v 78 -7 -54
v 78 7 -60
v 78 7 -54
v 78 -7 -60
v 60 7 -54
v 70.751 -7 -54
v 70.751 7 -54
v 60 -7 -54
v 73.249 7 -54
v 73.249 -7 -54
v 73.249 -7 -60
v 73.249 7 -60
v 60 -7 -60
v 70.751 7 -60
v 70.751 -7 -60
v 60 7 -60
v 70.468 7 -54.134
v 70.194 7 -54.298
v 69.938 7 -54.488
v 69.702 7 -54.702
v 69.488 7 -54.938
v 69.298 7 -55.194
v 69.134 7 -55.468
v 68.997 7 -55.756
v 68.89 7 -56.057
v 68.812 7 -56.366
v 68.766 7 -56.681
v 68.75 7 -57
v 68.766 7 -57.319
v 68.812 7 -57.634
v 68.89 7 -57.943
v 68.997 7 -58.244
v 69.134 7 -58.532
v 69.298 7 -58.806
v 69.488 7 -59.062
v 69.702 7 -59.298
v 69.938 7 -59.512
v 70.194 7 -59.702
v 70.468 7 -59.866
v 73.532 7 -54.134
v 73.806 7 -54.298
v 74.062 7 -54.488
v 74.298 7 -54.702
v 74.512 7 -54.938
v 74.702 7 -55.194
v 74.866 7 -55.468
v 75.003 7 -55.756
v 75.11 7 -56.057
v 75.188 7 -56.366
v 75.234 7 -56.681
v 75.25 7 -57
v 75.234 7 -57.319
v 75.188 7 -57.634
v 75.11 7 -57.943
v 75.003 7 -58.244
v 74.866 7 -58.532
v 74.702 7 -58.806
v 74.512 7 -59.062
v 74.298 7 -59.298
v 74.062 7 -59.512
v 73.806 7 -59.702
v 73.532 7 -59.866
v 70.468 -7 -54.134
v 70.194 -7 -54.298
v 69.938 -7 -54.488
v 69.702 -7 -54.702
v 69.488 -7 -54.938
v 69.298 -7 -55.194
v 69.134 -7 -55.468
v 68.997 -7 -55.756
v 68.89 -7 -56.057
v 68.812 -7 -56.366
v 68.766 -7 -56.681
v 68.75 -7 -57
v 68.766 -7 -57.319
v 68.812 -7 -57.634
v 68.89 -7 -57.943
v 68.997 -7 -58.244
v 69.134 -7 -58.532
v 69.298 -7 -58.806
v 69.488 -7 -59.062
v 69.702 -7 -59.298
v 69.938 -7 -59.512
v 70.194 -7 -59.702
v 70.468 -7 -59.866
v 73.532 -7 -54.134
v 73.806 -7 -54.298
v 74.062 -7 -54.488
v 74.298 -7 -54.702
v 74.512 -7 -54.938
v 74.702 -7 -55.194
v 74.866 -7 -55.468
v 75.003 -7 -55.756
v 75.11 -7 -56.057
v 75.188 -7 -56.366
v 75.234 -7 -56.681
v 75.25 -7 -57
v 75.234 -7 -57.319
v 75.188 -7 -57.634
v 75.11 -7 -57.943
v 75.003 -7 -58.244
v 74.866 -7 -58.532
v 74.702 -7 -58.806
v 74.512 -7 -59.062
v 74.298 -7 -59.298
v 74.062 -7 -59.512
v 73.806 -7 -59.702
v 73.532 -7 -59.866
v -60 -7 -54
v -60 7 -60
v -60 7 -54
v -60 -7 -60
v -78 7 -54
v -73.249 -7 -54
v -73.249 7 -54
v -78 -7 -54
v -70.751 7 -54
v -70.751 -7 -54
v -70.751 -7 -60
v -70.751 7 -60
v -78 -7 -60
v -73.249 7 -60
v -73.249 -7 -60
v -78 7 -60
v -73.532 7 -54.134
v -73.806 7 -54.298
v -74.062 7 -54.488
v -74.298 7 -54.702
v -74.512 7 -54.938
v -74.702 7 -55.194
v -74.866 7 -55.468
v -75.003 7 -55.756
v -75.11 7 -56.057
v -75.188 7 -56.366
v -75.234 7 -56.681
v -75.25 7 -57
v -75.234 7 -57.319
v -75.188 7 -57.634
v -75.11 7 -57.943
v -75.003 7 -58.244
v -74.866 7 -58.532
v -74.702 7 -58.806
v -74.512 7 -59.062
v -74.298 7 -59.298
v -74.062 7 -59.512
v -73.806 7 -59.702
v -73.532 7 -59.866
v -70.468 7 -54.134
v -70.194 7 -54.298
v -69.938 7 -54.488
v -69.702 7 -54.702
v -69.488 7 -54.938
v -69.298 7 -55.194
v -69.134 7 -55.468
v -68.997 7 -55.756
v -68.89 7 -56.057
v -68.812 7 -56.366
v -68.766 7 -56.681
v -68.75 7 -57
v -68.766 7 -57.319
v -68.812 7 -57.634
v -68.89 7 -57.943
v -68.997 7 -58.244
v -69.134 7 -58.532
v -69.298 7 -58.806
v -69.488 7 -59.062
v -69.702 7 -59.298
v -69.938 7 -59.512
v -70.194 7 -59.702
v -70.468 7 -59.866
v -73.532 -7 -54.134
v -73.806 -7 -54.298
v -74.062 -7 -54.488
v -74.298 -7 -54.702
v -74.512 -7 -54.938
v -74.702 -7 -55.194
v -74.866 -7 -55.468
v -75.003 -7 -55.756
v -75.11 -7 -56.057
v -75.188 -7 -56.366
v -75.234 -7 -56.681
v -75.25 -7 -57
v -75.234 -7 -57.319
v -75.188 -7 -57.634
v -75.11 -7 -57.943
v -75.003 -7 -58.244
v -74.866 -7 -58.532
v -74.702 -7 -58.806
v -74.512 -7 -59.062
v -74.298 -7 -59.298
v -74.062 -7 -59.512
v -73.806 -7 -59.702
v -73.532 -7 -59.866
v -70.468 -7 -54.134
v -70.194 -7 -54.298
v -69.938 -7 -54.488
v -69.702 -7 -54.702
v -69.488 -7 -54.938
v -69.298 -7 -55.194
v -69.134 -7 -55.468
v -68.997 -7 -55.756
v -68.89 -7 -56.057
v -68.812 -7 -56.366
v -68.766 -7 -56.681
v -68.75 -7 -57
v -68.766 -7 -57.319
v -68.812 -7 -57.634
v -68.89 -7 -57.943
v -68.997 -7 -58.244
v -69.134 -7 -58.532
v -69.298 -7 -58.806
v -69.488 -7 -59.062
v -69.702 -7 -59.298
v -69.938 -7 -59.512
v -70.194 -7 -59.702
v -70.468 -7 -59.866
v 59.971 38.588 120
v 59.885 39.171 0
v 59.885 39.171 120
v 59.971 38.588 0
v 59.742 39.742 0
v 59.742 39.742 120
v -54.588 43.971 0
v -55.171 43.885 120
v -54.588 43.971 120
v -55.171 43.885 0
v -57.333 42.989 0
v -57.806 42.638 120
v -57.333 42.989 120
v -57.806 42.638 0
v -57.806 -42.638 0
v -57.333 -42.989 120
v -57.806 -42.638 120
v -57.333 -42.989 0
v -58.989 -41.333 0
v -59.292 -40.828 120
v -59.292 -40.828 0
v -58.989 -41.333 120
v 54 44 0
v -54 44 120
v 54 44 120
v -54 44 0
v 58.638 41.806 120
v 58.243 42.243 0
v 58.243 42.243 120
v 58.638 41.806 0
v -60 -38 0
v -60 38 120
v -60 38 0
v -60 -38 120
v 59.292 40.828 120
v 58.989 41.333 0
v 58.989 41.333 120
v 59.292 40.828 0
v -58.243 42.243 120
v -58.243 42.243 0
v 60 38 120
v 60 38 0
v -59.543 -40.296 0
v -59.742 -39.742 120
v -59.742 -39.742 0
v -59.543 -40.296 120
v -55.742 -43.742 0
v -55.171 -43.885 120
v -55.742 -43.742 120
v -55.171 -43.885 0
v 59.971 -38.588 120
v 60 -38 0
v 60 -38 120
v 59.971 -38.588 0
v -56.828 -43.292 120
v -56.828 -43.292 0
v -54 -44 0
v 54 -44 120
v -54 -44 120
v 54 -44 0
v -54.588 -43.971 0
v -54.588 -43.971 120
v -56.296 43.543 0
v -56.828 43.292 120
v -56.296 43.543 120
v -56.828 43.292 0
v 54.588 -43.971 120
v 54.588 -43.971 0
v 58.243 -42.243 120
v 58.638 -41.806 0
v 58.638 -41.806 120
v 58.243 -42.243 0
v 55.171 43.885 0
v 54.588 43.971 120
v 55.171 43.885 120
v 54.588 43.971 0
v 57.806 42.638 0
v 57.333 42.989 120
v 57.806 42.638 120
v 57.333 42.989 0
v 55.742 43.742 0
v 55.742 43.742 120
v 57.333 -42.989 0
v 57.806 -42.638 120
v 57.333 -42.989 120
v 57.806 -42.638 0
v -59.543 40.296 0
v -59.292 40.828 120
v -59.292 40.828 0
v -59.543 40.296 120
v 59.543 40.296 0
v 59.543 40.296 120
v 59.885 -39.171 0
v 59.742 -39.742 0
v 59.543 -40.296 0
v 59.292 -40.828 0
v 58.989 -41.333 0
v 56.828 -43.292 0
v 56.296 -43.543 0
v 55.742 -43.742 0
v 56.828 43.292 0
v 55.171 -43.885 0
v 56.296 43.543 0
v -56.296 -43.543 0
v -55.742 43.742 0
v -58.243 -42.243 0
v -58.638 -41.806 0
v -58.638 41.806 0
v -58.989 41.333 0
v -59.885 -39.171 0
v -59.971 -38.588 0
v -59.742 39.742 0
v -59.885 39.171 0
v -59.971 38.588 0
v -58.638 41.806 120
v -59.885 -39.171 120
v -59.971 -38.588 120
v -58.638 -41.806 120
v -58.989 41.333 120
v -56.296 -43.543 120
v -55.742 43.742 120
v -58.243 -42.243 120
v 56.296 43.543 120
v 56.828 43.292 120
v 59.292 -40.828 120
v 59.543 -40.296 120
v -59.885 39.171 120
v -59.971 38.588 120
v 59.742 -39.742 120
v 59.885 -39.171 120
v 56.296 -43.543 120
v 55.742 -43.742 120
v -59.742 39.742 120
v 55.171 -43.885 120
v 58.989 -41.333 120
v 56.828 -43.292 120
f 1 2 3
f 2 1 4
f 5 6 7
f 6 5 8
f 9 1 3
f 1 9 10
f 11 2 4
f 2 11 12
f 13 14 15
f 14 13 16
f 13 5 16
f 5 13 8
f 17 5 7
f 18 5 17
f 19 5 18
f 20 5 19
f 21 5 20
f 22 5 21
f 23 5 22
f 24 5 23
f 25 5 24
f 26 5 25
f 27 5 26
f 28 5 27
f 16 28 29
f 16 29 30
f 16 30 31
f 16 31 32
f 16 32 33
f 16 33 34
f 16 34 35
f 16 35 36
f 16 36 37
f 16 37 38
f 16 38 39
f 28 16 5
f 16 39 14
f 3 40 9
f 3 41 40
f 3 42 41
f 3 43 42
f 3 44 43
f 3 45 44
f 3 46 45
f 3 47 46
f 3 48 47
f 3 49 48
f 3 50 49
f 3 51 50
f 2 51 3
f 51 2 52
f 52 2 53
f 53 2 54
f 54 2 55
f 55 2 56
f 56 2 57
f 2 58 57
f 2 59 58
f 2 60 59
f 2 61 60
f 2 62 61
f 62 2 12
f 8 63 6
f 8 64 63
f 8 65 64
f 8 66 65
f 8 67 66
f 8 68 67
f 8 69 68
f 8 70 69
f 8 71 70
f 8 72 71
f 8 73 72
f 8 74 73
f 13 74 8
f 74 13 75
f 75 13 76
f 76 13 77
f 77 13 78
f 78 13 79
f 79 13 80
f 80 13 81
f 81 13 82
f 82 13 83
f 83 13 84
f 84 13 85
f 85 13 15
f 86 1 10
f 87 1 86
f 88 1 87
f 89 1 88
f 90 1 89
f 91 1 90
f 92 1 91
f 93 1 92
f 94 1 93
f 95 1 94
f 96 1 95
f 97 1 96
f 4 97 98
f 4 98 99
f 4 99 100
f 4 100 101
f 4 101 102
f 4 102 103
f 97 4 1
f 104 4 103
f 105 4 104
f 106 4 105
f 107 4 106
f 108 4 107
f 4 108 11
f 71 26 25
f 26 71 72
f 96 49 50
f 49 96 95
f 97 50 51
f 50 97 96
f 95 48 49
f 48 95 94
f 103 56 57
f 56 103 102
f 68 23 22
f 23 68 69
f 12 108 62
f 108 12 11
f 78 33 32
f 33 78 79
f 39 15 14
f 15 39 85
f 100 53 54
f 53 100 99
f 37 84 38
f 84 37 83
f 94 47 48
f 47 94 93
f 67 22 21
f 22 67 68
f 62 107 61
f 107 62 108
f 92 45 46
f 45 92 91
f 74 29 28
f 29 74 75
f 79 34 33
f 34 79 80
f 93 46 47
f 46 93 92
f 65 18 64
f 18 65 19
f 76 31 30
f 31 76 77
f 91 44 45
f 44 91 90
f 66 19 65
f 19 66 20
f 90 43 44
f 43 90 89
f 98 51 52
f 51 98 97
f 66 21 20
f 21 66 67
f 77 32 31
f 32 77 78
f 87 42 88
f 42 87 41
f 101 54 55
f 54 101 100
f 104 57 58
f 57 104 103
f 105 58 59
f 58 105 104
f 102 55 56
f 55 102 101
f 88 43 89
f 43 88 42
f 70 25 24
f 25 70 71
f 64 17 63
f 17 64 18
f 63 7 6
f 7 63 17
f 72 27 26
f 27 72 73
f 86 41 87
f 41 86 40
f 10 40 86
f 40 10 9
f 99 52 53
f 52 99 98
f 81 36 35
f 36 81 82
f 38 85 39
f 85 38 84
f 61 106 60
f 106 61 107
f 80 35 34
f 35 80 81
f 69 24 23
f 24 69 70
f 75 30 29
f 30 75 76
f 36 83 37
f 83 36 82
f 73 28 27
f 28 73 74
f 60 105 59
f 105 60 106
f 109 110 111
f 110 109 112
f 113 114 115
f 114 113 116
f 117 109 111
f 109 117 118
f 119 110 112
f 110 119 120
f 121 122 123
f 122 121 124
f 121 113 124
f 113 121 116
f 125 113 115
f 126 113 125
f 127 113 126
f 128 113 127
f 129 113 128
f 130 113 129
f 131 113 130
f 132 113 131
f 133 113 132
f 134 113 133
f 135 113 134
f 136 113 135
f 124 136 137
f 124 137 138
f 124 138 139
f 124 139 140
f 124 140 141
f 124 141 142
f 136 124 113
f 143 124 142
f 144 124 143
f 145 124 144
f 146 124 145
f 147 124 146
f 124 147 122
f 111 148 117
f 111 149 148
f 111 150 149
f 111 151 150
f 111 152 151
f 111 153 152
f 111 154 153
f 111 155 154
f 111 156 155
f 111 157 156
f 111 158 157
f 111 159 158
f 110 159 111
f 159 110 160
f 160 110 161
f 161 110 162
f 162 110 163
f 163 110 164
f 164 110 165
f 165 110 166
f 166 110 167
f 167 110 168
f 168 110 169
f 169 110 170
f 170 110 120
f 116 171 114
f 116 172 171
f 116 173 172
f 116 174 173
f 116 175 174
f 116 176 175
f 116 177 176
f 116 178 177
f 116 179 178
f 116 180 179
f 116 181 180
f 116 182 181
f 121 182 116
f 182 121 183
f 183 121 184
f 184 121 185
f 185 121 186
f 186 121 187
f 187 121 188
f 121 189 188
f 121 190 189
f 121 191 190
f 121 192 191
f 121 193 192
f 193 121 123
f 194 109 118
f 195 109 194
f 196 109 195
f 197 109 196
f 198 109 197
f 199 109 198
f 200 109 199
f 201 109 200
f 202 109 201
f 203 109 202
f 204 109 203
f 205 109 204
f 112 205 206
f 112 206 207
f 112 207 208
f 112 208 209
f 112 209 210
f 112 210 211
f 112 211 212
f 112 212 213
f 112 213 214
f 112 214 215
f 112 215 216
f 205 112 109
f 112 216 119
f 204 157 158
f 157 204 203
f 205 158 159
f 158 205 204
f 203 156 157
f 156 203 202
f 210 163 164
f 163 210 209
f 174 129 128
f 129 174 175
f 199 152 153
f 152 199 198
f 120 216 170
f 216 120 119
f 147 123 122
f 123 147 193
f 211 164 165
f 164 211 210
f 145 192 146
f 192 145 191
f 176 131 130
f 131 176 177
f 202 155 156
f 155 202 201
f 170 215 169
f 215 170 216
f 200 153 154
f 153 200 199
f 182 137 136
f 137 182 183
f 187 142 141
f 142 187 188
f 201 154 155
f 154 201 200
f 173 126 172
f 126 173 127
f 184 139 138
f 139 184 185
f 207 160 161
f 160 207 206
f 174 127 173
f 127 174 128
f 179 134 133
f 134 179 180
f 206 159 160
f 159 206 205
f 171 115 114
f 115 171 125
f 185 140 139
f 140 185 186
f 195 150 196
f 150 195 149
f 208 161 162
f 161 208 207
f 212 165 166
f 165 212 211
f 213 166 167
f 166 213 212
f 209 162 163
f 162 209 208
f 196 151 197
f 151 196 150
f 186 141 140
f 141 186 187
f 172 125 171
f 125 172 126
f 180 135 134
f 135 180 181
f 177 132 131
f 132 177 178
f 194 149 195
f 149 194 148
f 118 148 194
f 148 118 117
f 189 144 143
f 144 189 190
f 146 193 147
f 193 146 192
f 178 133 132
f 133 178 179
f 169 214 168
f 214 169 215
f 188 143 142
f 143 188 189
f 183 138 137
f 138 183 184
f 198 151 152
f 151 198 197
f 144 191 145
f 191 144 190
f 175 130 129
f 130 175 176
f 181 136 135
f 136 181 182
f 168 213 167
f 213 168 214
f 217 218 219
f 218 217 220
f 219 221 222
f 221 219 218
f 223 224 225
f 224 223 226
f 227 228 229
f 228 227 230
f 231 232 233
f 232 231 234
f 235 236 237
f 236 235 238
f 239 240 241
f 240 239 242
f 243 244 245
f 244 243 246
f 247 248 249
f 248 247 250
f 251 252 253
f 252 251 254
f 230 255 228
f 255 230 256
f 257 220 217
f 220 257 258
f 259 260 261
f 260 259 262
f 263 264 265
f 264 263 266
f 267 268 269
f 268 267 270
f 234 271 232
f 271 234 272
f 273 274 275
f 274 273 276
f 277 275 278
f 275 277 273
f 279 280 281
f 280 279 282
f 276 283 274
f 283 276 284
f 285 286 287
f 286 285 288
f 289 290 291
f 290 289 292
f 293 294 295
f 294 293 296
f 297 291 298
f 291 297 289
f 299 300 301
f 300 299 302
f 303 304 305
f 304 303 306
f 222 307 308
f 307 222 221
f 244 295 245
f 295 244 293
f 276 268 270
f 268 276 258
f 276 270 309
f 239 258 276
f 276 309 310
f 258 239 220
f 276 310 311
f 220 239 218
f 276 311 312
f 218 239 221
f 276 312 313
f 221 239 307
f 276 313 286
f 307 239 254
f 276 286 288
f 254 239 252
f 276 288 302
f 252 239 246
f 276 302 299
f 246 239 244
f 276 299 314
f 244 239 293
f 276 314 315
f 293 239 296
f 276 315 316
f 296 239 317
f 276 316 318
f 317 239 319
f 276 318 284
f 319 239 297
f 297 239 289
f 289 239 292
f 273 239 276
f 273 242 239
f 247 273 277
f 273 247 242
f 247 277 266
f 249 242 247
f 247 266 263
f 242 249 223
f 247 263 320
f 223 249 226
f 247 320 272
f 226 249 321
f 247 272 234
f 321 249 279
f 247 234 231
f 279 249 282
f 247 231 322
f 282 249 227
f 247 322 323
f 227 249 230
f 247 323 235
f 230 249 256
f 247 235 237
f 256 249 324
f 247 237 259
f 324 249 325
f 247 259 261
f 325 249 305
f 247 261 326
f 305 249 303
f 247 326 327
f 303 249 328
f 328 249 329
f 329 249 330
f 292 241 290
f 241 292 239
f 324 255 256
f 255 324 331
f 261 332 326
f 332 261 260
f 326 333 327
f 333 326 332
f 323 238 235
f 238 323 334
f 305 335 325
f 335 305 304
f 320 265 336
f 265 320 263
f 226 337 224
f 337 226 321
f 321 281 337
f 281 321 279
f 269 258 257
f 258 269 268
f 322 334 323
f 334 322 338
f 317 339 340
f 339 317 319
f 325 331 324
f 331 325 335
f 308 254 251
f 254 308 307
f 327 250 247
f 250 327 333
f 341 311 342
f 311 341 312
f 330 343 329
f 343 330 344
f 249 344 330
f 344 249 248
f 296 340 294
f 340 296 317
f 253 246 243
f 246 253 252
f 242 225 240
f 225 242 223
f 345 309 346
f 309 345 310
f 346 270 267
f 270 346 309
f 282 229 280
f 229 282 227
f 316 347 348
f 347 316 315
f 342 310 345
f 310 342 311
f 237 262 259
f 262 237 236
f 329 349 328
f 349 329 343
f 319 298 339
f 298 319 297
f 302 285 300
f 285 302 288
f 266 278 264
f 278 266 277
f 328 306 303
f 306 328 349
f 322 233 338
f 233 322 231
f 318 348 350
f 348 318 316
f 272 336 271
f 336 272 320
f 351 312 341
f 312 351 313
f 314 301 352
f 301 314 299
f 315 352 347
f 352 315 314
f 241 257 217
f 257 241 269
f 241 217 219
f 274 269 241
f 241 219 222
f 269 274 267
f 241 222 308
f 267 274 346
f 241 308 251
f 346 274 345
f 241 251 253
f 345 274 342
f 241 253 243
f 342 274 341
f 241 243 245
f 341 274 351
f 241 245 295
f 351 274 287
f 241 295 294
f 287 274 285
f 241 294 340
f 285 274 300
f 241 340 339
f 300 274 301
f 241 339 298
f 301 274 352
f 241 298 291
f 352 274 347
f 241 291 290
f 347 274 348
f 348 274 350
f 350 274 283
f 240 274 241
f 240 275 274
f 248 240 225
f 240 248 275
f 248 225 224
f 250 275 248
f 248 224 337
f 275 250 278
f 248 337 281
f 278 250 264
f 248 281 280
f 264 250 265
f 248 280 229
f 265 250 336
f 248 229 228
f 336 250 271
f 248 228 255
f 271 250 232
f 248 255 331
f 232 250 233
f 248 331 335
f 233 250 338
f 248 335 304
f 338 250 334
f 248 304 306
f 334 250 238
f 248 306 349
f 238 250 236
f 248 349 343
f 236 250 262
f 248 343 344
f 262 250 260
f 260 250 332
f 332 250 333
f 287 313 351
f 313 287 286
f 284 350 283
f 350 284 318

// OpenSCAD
$fn=64;

L=120.0;
W=88.0;
H=120.0;

module rounded_box(size=[10,10,10], r=2){
    l=size[0]; w=size[1]; h=size[2];
    r2=min(r, min(l,w)/2);
    hull(){
        for(x=[-l/2+r2, l/2-r2])
            for(y=[-w/2+r2, w/2-r2])
                translate([x,y,0]) cylinder(h=h, r=r2);
    }
}

module mounting_foot(side=1, foot_len=18, foot_w=14, foot_h=6, hole_d=6.5, hole_offset=6){
    x = side*(L/2 + foot_len/2);
    translate([x,0,-H/2 + foot_h/2])
    difference(){
        cube([foot_len, foot_w, foot_h], center=true);
        translate([side*(foot_len/2 - hole_offset),0,0])
            rotate([90,0,0]) cylinder(h=foot_w+2, d=hole_d, center=true);
    }
}

module terminal_block(side=1, blk_l=26, blk_w=18, blk_h=14, post_d=3.2, post_h=10, post_pitch=7.5){
    x = side*(L/2 - blk_l/2 - 6);
    y = 0;
    z = H/2 - blk_h/2 - 6;
    translate([x,y,z]){
        union(){
            cube([blk_l, blk_w, blk_h], center=true);
            for(i=[-1.5,-0.5,0.5,1.5]){
                translate([i*post_pitch, 0, blk_h/2 + post_h/2])
                    cylinder(h=post_h, d=post_d, center=true);
            }
        }
    }
}

module transformer_body(){
    union(){
        rounded_box([L,W,H], r=6);
        mounting_foot(1);
        mounting_foot(-1);
        terminal_block(1);
        terminal_block(-1);
    }
}

transformer_body();
